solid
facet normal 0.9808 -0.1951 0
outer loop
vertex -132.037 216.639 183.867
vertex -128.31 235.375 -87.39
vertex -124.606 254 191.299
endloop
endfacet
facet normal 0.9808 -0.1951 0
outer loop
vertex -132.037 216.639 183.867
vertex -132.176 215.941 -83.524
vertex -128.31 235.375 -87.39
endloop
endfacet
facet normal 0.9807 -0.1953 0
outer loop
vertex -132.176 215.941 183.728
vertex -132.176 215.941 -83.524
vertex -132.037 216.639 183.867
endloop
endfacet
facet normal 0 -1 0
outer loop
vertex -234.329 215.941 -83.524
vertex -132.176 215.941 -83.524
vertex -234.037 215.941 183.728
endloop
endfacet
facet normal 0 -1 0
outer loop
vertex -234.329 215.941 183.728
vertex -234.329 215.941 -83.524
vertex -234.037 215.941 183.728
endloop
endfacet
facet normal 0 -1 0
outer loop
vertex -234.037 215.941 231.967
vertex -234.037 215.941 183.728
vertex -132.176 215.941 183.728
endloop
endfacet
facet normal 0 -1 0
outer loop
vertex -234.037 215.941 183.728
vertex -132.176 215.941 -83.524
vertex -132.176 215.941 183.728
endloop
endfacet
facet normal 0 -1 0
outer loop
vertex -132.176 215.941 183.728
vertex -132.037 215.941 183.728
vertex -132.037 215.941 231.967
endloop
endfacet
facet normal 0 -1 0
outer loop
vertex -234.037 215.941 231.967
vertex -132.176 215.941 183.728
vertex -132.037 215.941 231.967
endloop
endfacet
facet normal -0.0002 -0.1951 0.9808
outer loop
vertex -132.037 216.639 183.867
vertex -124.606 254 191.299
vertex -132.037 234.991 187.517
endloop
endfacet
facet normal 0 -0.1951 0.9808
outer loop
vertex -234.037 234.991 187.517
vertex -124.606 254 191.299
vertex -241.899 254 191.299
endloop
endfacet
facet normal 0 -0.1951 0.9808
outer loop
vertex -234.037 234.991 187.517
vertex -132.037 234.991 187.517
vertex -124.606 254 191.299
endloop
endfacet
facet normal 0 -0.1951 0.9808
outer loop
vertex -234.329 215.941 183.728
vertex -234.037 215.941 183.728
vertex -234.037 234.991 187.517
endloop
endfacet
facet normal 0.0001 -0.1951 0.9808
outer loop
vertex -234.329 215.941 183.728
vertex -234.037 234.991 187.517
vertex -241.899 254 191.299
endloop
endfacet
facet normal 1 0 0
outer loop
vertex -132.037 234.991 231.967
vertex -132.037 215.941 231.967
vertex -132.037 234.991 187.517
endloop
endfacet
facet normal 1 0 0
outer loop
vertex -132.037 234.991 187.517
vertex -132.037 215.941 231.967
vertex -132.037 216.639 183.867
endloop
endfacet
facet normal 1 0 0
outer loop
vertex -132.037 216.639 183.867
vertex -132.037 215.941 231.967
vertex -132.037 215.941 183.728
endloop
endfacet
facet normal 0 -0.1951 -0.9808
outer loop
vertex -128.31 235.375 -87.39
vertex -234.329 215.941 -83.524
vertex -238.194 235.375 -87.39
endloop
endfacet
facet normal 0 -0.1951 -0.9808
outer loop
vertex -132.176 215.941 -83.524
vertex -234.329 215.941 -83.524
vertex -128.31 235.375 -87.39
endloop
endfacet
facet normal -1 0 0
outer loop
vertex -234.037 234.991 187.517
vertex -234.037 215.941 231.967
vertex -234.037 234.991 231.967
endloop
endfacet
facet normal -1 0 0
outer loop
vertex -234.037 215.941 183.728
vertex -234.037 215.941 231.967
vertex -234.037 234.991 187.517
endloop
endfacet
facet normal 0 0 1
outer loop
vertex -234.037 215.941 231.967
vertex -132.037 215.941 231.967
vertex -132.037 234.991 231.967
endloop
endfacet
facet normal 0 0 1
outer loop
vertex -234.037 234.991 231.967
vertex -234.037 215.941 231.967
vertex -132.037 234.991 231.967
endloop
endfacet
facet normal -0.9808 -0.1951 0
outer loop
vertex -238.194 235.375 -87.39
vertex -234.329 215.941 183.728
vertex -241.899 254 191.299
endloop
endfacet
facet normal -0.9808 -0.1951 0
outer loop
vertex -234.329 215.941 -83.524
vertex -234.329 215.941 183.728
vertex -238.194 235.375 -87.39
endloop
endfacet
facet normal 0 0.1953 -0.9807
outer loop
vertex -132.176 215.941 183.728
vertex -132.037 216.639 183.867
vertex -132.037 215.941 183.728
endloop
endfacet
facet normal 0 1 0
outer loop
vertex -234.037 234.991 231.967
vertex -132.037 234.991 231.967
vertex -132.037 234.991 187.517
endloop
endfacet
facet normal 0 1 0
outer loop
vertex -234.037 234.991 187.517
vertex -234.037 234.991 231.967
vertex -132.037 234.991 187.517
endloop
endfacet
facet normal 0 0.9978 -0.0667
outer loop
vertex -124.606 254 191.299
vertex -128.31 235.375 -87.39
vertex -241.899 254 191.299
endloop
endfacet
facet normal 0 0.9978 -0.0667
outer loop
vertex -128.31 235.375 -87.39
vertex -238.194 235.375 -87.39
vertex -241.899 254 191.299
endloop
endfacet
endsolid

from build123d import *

# Parameters (mm, degrees)
SKETCH1_W             = 203.2
SKETCH1_H             = 368.3
BOSS_EXTRUDE4_DEPTH   = 254
BOSS_EXTRUDE4_TAPER   = 11.25
CUT_EXTRUDE1_DEPTH    = 254
BOSS_EXTRUDE5_START   = -151.75
BOSS_EXTRUDE5_DEPTH   = 102
BODY_MOVE_COPY1_ANGLE = 180


with BuildPart() as part:
    # Sketch1 → Boss-Extrude4 (new body)
    with BuildSketch(Plane(origin=(0, 0, 0), x_dir=(1, 0, 0), z_dir=(0, 1, 0))):
        with Locations((-183.252356021, -50.101832461)):
            Rectangle(SKETCH1_W, SKETCH1_H)
    extrude(amount=BOSS_EXTRUDE4_DEPTH, taper=BOSS_EXTRUDE4_TAPER)

    # Sketch2 → Cut-Extrude1 (cut)
    with BuildSketch(Plane(origin=(-82.7176, 0, 0), x_dir=(0, 0, -1), z_dir=(1, 0, 0))):
        Polygon((-234.106807468, 0), (147.485457697, 0), (93.149429588, 234.95), (-191.90501696, 215.9), align=None)
    extrude(amount=-CUT_EXTRUDE1_DEPTH, mode=Mode.SUBTRACT)


with BuildPart() as cut_extrude1_kept_piece:
    # of the separate pieces the step leaves, the one the design keeps (cut_extrude1_pieces_kept)
    add(part.part.solids().sort_by_distance((-238.194452935, 234.565118806, -87.390264453))[0])

    # Sketch3 → Boss-Extrude5 (add)
    with BuildSketch(Plane(origin=(-82.7176, 0, 0), x_dir=(0, 0, -1), z_dir=(1, 0, 0)).offset(BOSS_EXTRUDE5_START)):
        Polygon((-183.728091146, 254), (-231.967371745, 254), (-231.967371745, 234.95), (-187.517371745, 234.95), align=None)
    extrude(amount=BOSS_EXTRUDE5_DEPTH)


with BuildPart() as cut_extrude1_kept_piece_1:
    # Body-Move/Copy1: moved
    add(cut_extrude1_kept_piece.part.rotate(Axis((-183.252356021, 234.970263522, 0), (0, 0, 1)), BODY_MOVE_COPY1_ANGLE))


solid = cut_extrude1_kept_piece_1.part
